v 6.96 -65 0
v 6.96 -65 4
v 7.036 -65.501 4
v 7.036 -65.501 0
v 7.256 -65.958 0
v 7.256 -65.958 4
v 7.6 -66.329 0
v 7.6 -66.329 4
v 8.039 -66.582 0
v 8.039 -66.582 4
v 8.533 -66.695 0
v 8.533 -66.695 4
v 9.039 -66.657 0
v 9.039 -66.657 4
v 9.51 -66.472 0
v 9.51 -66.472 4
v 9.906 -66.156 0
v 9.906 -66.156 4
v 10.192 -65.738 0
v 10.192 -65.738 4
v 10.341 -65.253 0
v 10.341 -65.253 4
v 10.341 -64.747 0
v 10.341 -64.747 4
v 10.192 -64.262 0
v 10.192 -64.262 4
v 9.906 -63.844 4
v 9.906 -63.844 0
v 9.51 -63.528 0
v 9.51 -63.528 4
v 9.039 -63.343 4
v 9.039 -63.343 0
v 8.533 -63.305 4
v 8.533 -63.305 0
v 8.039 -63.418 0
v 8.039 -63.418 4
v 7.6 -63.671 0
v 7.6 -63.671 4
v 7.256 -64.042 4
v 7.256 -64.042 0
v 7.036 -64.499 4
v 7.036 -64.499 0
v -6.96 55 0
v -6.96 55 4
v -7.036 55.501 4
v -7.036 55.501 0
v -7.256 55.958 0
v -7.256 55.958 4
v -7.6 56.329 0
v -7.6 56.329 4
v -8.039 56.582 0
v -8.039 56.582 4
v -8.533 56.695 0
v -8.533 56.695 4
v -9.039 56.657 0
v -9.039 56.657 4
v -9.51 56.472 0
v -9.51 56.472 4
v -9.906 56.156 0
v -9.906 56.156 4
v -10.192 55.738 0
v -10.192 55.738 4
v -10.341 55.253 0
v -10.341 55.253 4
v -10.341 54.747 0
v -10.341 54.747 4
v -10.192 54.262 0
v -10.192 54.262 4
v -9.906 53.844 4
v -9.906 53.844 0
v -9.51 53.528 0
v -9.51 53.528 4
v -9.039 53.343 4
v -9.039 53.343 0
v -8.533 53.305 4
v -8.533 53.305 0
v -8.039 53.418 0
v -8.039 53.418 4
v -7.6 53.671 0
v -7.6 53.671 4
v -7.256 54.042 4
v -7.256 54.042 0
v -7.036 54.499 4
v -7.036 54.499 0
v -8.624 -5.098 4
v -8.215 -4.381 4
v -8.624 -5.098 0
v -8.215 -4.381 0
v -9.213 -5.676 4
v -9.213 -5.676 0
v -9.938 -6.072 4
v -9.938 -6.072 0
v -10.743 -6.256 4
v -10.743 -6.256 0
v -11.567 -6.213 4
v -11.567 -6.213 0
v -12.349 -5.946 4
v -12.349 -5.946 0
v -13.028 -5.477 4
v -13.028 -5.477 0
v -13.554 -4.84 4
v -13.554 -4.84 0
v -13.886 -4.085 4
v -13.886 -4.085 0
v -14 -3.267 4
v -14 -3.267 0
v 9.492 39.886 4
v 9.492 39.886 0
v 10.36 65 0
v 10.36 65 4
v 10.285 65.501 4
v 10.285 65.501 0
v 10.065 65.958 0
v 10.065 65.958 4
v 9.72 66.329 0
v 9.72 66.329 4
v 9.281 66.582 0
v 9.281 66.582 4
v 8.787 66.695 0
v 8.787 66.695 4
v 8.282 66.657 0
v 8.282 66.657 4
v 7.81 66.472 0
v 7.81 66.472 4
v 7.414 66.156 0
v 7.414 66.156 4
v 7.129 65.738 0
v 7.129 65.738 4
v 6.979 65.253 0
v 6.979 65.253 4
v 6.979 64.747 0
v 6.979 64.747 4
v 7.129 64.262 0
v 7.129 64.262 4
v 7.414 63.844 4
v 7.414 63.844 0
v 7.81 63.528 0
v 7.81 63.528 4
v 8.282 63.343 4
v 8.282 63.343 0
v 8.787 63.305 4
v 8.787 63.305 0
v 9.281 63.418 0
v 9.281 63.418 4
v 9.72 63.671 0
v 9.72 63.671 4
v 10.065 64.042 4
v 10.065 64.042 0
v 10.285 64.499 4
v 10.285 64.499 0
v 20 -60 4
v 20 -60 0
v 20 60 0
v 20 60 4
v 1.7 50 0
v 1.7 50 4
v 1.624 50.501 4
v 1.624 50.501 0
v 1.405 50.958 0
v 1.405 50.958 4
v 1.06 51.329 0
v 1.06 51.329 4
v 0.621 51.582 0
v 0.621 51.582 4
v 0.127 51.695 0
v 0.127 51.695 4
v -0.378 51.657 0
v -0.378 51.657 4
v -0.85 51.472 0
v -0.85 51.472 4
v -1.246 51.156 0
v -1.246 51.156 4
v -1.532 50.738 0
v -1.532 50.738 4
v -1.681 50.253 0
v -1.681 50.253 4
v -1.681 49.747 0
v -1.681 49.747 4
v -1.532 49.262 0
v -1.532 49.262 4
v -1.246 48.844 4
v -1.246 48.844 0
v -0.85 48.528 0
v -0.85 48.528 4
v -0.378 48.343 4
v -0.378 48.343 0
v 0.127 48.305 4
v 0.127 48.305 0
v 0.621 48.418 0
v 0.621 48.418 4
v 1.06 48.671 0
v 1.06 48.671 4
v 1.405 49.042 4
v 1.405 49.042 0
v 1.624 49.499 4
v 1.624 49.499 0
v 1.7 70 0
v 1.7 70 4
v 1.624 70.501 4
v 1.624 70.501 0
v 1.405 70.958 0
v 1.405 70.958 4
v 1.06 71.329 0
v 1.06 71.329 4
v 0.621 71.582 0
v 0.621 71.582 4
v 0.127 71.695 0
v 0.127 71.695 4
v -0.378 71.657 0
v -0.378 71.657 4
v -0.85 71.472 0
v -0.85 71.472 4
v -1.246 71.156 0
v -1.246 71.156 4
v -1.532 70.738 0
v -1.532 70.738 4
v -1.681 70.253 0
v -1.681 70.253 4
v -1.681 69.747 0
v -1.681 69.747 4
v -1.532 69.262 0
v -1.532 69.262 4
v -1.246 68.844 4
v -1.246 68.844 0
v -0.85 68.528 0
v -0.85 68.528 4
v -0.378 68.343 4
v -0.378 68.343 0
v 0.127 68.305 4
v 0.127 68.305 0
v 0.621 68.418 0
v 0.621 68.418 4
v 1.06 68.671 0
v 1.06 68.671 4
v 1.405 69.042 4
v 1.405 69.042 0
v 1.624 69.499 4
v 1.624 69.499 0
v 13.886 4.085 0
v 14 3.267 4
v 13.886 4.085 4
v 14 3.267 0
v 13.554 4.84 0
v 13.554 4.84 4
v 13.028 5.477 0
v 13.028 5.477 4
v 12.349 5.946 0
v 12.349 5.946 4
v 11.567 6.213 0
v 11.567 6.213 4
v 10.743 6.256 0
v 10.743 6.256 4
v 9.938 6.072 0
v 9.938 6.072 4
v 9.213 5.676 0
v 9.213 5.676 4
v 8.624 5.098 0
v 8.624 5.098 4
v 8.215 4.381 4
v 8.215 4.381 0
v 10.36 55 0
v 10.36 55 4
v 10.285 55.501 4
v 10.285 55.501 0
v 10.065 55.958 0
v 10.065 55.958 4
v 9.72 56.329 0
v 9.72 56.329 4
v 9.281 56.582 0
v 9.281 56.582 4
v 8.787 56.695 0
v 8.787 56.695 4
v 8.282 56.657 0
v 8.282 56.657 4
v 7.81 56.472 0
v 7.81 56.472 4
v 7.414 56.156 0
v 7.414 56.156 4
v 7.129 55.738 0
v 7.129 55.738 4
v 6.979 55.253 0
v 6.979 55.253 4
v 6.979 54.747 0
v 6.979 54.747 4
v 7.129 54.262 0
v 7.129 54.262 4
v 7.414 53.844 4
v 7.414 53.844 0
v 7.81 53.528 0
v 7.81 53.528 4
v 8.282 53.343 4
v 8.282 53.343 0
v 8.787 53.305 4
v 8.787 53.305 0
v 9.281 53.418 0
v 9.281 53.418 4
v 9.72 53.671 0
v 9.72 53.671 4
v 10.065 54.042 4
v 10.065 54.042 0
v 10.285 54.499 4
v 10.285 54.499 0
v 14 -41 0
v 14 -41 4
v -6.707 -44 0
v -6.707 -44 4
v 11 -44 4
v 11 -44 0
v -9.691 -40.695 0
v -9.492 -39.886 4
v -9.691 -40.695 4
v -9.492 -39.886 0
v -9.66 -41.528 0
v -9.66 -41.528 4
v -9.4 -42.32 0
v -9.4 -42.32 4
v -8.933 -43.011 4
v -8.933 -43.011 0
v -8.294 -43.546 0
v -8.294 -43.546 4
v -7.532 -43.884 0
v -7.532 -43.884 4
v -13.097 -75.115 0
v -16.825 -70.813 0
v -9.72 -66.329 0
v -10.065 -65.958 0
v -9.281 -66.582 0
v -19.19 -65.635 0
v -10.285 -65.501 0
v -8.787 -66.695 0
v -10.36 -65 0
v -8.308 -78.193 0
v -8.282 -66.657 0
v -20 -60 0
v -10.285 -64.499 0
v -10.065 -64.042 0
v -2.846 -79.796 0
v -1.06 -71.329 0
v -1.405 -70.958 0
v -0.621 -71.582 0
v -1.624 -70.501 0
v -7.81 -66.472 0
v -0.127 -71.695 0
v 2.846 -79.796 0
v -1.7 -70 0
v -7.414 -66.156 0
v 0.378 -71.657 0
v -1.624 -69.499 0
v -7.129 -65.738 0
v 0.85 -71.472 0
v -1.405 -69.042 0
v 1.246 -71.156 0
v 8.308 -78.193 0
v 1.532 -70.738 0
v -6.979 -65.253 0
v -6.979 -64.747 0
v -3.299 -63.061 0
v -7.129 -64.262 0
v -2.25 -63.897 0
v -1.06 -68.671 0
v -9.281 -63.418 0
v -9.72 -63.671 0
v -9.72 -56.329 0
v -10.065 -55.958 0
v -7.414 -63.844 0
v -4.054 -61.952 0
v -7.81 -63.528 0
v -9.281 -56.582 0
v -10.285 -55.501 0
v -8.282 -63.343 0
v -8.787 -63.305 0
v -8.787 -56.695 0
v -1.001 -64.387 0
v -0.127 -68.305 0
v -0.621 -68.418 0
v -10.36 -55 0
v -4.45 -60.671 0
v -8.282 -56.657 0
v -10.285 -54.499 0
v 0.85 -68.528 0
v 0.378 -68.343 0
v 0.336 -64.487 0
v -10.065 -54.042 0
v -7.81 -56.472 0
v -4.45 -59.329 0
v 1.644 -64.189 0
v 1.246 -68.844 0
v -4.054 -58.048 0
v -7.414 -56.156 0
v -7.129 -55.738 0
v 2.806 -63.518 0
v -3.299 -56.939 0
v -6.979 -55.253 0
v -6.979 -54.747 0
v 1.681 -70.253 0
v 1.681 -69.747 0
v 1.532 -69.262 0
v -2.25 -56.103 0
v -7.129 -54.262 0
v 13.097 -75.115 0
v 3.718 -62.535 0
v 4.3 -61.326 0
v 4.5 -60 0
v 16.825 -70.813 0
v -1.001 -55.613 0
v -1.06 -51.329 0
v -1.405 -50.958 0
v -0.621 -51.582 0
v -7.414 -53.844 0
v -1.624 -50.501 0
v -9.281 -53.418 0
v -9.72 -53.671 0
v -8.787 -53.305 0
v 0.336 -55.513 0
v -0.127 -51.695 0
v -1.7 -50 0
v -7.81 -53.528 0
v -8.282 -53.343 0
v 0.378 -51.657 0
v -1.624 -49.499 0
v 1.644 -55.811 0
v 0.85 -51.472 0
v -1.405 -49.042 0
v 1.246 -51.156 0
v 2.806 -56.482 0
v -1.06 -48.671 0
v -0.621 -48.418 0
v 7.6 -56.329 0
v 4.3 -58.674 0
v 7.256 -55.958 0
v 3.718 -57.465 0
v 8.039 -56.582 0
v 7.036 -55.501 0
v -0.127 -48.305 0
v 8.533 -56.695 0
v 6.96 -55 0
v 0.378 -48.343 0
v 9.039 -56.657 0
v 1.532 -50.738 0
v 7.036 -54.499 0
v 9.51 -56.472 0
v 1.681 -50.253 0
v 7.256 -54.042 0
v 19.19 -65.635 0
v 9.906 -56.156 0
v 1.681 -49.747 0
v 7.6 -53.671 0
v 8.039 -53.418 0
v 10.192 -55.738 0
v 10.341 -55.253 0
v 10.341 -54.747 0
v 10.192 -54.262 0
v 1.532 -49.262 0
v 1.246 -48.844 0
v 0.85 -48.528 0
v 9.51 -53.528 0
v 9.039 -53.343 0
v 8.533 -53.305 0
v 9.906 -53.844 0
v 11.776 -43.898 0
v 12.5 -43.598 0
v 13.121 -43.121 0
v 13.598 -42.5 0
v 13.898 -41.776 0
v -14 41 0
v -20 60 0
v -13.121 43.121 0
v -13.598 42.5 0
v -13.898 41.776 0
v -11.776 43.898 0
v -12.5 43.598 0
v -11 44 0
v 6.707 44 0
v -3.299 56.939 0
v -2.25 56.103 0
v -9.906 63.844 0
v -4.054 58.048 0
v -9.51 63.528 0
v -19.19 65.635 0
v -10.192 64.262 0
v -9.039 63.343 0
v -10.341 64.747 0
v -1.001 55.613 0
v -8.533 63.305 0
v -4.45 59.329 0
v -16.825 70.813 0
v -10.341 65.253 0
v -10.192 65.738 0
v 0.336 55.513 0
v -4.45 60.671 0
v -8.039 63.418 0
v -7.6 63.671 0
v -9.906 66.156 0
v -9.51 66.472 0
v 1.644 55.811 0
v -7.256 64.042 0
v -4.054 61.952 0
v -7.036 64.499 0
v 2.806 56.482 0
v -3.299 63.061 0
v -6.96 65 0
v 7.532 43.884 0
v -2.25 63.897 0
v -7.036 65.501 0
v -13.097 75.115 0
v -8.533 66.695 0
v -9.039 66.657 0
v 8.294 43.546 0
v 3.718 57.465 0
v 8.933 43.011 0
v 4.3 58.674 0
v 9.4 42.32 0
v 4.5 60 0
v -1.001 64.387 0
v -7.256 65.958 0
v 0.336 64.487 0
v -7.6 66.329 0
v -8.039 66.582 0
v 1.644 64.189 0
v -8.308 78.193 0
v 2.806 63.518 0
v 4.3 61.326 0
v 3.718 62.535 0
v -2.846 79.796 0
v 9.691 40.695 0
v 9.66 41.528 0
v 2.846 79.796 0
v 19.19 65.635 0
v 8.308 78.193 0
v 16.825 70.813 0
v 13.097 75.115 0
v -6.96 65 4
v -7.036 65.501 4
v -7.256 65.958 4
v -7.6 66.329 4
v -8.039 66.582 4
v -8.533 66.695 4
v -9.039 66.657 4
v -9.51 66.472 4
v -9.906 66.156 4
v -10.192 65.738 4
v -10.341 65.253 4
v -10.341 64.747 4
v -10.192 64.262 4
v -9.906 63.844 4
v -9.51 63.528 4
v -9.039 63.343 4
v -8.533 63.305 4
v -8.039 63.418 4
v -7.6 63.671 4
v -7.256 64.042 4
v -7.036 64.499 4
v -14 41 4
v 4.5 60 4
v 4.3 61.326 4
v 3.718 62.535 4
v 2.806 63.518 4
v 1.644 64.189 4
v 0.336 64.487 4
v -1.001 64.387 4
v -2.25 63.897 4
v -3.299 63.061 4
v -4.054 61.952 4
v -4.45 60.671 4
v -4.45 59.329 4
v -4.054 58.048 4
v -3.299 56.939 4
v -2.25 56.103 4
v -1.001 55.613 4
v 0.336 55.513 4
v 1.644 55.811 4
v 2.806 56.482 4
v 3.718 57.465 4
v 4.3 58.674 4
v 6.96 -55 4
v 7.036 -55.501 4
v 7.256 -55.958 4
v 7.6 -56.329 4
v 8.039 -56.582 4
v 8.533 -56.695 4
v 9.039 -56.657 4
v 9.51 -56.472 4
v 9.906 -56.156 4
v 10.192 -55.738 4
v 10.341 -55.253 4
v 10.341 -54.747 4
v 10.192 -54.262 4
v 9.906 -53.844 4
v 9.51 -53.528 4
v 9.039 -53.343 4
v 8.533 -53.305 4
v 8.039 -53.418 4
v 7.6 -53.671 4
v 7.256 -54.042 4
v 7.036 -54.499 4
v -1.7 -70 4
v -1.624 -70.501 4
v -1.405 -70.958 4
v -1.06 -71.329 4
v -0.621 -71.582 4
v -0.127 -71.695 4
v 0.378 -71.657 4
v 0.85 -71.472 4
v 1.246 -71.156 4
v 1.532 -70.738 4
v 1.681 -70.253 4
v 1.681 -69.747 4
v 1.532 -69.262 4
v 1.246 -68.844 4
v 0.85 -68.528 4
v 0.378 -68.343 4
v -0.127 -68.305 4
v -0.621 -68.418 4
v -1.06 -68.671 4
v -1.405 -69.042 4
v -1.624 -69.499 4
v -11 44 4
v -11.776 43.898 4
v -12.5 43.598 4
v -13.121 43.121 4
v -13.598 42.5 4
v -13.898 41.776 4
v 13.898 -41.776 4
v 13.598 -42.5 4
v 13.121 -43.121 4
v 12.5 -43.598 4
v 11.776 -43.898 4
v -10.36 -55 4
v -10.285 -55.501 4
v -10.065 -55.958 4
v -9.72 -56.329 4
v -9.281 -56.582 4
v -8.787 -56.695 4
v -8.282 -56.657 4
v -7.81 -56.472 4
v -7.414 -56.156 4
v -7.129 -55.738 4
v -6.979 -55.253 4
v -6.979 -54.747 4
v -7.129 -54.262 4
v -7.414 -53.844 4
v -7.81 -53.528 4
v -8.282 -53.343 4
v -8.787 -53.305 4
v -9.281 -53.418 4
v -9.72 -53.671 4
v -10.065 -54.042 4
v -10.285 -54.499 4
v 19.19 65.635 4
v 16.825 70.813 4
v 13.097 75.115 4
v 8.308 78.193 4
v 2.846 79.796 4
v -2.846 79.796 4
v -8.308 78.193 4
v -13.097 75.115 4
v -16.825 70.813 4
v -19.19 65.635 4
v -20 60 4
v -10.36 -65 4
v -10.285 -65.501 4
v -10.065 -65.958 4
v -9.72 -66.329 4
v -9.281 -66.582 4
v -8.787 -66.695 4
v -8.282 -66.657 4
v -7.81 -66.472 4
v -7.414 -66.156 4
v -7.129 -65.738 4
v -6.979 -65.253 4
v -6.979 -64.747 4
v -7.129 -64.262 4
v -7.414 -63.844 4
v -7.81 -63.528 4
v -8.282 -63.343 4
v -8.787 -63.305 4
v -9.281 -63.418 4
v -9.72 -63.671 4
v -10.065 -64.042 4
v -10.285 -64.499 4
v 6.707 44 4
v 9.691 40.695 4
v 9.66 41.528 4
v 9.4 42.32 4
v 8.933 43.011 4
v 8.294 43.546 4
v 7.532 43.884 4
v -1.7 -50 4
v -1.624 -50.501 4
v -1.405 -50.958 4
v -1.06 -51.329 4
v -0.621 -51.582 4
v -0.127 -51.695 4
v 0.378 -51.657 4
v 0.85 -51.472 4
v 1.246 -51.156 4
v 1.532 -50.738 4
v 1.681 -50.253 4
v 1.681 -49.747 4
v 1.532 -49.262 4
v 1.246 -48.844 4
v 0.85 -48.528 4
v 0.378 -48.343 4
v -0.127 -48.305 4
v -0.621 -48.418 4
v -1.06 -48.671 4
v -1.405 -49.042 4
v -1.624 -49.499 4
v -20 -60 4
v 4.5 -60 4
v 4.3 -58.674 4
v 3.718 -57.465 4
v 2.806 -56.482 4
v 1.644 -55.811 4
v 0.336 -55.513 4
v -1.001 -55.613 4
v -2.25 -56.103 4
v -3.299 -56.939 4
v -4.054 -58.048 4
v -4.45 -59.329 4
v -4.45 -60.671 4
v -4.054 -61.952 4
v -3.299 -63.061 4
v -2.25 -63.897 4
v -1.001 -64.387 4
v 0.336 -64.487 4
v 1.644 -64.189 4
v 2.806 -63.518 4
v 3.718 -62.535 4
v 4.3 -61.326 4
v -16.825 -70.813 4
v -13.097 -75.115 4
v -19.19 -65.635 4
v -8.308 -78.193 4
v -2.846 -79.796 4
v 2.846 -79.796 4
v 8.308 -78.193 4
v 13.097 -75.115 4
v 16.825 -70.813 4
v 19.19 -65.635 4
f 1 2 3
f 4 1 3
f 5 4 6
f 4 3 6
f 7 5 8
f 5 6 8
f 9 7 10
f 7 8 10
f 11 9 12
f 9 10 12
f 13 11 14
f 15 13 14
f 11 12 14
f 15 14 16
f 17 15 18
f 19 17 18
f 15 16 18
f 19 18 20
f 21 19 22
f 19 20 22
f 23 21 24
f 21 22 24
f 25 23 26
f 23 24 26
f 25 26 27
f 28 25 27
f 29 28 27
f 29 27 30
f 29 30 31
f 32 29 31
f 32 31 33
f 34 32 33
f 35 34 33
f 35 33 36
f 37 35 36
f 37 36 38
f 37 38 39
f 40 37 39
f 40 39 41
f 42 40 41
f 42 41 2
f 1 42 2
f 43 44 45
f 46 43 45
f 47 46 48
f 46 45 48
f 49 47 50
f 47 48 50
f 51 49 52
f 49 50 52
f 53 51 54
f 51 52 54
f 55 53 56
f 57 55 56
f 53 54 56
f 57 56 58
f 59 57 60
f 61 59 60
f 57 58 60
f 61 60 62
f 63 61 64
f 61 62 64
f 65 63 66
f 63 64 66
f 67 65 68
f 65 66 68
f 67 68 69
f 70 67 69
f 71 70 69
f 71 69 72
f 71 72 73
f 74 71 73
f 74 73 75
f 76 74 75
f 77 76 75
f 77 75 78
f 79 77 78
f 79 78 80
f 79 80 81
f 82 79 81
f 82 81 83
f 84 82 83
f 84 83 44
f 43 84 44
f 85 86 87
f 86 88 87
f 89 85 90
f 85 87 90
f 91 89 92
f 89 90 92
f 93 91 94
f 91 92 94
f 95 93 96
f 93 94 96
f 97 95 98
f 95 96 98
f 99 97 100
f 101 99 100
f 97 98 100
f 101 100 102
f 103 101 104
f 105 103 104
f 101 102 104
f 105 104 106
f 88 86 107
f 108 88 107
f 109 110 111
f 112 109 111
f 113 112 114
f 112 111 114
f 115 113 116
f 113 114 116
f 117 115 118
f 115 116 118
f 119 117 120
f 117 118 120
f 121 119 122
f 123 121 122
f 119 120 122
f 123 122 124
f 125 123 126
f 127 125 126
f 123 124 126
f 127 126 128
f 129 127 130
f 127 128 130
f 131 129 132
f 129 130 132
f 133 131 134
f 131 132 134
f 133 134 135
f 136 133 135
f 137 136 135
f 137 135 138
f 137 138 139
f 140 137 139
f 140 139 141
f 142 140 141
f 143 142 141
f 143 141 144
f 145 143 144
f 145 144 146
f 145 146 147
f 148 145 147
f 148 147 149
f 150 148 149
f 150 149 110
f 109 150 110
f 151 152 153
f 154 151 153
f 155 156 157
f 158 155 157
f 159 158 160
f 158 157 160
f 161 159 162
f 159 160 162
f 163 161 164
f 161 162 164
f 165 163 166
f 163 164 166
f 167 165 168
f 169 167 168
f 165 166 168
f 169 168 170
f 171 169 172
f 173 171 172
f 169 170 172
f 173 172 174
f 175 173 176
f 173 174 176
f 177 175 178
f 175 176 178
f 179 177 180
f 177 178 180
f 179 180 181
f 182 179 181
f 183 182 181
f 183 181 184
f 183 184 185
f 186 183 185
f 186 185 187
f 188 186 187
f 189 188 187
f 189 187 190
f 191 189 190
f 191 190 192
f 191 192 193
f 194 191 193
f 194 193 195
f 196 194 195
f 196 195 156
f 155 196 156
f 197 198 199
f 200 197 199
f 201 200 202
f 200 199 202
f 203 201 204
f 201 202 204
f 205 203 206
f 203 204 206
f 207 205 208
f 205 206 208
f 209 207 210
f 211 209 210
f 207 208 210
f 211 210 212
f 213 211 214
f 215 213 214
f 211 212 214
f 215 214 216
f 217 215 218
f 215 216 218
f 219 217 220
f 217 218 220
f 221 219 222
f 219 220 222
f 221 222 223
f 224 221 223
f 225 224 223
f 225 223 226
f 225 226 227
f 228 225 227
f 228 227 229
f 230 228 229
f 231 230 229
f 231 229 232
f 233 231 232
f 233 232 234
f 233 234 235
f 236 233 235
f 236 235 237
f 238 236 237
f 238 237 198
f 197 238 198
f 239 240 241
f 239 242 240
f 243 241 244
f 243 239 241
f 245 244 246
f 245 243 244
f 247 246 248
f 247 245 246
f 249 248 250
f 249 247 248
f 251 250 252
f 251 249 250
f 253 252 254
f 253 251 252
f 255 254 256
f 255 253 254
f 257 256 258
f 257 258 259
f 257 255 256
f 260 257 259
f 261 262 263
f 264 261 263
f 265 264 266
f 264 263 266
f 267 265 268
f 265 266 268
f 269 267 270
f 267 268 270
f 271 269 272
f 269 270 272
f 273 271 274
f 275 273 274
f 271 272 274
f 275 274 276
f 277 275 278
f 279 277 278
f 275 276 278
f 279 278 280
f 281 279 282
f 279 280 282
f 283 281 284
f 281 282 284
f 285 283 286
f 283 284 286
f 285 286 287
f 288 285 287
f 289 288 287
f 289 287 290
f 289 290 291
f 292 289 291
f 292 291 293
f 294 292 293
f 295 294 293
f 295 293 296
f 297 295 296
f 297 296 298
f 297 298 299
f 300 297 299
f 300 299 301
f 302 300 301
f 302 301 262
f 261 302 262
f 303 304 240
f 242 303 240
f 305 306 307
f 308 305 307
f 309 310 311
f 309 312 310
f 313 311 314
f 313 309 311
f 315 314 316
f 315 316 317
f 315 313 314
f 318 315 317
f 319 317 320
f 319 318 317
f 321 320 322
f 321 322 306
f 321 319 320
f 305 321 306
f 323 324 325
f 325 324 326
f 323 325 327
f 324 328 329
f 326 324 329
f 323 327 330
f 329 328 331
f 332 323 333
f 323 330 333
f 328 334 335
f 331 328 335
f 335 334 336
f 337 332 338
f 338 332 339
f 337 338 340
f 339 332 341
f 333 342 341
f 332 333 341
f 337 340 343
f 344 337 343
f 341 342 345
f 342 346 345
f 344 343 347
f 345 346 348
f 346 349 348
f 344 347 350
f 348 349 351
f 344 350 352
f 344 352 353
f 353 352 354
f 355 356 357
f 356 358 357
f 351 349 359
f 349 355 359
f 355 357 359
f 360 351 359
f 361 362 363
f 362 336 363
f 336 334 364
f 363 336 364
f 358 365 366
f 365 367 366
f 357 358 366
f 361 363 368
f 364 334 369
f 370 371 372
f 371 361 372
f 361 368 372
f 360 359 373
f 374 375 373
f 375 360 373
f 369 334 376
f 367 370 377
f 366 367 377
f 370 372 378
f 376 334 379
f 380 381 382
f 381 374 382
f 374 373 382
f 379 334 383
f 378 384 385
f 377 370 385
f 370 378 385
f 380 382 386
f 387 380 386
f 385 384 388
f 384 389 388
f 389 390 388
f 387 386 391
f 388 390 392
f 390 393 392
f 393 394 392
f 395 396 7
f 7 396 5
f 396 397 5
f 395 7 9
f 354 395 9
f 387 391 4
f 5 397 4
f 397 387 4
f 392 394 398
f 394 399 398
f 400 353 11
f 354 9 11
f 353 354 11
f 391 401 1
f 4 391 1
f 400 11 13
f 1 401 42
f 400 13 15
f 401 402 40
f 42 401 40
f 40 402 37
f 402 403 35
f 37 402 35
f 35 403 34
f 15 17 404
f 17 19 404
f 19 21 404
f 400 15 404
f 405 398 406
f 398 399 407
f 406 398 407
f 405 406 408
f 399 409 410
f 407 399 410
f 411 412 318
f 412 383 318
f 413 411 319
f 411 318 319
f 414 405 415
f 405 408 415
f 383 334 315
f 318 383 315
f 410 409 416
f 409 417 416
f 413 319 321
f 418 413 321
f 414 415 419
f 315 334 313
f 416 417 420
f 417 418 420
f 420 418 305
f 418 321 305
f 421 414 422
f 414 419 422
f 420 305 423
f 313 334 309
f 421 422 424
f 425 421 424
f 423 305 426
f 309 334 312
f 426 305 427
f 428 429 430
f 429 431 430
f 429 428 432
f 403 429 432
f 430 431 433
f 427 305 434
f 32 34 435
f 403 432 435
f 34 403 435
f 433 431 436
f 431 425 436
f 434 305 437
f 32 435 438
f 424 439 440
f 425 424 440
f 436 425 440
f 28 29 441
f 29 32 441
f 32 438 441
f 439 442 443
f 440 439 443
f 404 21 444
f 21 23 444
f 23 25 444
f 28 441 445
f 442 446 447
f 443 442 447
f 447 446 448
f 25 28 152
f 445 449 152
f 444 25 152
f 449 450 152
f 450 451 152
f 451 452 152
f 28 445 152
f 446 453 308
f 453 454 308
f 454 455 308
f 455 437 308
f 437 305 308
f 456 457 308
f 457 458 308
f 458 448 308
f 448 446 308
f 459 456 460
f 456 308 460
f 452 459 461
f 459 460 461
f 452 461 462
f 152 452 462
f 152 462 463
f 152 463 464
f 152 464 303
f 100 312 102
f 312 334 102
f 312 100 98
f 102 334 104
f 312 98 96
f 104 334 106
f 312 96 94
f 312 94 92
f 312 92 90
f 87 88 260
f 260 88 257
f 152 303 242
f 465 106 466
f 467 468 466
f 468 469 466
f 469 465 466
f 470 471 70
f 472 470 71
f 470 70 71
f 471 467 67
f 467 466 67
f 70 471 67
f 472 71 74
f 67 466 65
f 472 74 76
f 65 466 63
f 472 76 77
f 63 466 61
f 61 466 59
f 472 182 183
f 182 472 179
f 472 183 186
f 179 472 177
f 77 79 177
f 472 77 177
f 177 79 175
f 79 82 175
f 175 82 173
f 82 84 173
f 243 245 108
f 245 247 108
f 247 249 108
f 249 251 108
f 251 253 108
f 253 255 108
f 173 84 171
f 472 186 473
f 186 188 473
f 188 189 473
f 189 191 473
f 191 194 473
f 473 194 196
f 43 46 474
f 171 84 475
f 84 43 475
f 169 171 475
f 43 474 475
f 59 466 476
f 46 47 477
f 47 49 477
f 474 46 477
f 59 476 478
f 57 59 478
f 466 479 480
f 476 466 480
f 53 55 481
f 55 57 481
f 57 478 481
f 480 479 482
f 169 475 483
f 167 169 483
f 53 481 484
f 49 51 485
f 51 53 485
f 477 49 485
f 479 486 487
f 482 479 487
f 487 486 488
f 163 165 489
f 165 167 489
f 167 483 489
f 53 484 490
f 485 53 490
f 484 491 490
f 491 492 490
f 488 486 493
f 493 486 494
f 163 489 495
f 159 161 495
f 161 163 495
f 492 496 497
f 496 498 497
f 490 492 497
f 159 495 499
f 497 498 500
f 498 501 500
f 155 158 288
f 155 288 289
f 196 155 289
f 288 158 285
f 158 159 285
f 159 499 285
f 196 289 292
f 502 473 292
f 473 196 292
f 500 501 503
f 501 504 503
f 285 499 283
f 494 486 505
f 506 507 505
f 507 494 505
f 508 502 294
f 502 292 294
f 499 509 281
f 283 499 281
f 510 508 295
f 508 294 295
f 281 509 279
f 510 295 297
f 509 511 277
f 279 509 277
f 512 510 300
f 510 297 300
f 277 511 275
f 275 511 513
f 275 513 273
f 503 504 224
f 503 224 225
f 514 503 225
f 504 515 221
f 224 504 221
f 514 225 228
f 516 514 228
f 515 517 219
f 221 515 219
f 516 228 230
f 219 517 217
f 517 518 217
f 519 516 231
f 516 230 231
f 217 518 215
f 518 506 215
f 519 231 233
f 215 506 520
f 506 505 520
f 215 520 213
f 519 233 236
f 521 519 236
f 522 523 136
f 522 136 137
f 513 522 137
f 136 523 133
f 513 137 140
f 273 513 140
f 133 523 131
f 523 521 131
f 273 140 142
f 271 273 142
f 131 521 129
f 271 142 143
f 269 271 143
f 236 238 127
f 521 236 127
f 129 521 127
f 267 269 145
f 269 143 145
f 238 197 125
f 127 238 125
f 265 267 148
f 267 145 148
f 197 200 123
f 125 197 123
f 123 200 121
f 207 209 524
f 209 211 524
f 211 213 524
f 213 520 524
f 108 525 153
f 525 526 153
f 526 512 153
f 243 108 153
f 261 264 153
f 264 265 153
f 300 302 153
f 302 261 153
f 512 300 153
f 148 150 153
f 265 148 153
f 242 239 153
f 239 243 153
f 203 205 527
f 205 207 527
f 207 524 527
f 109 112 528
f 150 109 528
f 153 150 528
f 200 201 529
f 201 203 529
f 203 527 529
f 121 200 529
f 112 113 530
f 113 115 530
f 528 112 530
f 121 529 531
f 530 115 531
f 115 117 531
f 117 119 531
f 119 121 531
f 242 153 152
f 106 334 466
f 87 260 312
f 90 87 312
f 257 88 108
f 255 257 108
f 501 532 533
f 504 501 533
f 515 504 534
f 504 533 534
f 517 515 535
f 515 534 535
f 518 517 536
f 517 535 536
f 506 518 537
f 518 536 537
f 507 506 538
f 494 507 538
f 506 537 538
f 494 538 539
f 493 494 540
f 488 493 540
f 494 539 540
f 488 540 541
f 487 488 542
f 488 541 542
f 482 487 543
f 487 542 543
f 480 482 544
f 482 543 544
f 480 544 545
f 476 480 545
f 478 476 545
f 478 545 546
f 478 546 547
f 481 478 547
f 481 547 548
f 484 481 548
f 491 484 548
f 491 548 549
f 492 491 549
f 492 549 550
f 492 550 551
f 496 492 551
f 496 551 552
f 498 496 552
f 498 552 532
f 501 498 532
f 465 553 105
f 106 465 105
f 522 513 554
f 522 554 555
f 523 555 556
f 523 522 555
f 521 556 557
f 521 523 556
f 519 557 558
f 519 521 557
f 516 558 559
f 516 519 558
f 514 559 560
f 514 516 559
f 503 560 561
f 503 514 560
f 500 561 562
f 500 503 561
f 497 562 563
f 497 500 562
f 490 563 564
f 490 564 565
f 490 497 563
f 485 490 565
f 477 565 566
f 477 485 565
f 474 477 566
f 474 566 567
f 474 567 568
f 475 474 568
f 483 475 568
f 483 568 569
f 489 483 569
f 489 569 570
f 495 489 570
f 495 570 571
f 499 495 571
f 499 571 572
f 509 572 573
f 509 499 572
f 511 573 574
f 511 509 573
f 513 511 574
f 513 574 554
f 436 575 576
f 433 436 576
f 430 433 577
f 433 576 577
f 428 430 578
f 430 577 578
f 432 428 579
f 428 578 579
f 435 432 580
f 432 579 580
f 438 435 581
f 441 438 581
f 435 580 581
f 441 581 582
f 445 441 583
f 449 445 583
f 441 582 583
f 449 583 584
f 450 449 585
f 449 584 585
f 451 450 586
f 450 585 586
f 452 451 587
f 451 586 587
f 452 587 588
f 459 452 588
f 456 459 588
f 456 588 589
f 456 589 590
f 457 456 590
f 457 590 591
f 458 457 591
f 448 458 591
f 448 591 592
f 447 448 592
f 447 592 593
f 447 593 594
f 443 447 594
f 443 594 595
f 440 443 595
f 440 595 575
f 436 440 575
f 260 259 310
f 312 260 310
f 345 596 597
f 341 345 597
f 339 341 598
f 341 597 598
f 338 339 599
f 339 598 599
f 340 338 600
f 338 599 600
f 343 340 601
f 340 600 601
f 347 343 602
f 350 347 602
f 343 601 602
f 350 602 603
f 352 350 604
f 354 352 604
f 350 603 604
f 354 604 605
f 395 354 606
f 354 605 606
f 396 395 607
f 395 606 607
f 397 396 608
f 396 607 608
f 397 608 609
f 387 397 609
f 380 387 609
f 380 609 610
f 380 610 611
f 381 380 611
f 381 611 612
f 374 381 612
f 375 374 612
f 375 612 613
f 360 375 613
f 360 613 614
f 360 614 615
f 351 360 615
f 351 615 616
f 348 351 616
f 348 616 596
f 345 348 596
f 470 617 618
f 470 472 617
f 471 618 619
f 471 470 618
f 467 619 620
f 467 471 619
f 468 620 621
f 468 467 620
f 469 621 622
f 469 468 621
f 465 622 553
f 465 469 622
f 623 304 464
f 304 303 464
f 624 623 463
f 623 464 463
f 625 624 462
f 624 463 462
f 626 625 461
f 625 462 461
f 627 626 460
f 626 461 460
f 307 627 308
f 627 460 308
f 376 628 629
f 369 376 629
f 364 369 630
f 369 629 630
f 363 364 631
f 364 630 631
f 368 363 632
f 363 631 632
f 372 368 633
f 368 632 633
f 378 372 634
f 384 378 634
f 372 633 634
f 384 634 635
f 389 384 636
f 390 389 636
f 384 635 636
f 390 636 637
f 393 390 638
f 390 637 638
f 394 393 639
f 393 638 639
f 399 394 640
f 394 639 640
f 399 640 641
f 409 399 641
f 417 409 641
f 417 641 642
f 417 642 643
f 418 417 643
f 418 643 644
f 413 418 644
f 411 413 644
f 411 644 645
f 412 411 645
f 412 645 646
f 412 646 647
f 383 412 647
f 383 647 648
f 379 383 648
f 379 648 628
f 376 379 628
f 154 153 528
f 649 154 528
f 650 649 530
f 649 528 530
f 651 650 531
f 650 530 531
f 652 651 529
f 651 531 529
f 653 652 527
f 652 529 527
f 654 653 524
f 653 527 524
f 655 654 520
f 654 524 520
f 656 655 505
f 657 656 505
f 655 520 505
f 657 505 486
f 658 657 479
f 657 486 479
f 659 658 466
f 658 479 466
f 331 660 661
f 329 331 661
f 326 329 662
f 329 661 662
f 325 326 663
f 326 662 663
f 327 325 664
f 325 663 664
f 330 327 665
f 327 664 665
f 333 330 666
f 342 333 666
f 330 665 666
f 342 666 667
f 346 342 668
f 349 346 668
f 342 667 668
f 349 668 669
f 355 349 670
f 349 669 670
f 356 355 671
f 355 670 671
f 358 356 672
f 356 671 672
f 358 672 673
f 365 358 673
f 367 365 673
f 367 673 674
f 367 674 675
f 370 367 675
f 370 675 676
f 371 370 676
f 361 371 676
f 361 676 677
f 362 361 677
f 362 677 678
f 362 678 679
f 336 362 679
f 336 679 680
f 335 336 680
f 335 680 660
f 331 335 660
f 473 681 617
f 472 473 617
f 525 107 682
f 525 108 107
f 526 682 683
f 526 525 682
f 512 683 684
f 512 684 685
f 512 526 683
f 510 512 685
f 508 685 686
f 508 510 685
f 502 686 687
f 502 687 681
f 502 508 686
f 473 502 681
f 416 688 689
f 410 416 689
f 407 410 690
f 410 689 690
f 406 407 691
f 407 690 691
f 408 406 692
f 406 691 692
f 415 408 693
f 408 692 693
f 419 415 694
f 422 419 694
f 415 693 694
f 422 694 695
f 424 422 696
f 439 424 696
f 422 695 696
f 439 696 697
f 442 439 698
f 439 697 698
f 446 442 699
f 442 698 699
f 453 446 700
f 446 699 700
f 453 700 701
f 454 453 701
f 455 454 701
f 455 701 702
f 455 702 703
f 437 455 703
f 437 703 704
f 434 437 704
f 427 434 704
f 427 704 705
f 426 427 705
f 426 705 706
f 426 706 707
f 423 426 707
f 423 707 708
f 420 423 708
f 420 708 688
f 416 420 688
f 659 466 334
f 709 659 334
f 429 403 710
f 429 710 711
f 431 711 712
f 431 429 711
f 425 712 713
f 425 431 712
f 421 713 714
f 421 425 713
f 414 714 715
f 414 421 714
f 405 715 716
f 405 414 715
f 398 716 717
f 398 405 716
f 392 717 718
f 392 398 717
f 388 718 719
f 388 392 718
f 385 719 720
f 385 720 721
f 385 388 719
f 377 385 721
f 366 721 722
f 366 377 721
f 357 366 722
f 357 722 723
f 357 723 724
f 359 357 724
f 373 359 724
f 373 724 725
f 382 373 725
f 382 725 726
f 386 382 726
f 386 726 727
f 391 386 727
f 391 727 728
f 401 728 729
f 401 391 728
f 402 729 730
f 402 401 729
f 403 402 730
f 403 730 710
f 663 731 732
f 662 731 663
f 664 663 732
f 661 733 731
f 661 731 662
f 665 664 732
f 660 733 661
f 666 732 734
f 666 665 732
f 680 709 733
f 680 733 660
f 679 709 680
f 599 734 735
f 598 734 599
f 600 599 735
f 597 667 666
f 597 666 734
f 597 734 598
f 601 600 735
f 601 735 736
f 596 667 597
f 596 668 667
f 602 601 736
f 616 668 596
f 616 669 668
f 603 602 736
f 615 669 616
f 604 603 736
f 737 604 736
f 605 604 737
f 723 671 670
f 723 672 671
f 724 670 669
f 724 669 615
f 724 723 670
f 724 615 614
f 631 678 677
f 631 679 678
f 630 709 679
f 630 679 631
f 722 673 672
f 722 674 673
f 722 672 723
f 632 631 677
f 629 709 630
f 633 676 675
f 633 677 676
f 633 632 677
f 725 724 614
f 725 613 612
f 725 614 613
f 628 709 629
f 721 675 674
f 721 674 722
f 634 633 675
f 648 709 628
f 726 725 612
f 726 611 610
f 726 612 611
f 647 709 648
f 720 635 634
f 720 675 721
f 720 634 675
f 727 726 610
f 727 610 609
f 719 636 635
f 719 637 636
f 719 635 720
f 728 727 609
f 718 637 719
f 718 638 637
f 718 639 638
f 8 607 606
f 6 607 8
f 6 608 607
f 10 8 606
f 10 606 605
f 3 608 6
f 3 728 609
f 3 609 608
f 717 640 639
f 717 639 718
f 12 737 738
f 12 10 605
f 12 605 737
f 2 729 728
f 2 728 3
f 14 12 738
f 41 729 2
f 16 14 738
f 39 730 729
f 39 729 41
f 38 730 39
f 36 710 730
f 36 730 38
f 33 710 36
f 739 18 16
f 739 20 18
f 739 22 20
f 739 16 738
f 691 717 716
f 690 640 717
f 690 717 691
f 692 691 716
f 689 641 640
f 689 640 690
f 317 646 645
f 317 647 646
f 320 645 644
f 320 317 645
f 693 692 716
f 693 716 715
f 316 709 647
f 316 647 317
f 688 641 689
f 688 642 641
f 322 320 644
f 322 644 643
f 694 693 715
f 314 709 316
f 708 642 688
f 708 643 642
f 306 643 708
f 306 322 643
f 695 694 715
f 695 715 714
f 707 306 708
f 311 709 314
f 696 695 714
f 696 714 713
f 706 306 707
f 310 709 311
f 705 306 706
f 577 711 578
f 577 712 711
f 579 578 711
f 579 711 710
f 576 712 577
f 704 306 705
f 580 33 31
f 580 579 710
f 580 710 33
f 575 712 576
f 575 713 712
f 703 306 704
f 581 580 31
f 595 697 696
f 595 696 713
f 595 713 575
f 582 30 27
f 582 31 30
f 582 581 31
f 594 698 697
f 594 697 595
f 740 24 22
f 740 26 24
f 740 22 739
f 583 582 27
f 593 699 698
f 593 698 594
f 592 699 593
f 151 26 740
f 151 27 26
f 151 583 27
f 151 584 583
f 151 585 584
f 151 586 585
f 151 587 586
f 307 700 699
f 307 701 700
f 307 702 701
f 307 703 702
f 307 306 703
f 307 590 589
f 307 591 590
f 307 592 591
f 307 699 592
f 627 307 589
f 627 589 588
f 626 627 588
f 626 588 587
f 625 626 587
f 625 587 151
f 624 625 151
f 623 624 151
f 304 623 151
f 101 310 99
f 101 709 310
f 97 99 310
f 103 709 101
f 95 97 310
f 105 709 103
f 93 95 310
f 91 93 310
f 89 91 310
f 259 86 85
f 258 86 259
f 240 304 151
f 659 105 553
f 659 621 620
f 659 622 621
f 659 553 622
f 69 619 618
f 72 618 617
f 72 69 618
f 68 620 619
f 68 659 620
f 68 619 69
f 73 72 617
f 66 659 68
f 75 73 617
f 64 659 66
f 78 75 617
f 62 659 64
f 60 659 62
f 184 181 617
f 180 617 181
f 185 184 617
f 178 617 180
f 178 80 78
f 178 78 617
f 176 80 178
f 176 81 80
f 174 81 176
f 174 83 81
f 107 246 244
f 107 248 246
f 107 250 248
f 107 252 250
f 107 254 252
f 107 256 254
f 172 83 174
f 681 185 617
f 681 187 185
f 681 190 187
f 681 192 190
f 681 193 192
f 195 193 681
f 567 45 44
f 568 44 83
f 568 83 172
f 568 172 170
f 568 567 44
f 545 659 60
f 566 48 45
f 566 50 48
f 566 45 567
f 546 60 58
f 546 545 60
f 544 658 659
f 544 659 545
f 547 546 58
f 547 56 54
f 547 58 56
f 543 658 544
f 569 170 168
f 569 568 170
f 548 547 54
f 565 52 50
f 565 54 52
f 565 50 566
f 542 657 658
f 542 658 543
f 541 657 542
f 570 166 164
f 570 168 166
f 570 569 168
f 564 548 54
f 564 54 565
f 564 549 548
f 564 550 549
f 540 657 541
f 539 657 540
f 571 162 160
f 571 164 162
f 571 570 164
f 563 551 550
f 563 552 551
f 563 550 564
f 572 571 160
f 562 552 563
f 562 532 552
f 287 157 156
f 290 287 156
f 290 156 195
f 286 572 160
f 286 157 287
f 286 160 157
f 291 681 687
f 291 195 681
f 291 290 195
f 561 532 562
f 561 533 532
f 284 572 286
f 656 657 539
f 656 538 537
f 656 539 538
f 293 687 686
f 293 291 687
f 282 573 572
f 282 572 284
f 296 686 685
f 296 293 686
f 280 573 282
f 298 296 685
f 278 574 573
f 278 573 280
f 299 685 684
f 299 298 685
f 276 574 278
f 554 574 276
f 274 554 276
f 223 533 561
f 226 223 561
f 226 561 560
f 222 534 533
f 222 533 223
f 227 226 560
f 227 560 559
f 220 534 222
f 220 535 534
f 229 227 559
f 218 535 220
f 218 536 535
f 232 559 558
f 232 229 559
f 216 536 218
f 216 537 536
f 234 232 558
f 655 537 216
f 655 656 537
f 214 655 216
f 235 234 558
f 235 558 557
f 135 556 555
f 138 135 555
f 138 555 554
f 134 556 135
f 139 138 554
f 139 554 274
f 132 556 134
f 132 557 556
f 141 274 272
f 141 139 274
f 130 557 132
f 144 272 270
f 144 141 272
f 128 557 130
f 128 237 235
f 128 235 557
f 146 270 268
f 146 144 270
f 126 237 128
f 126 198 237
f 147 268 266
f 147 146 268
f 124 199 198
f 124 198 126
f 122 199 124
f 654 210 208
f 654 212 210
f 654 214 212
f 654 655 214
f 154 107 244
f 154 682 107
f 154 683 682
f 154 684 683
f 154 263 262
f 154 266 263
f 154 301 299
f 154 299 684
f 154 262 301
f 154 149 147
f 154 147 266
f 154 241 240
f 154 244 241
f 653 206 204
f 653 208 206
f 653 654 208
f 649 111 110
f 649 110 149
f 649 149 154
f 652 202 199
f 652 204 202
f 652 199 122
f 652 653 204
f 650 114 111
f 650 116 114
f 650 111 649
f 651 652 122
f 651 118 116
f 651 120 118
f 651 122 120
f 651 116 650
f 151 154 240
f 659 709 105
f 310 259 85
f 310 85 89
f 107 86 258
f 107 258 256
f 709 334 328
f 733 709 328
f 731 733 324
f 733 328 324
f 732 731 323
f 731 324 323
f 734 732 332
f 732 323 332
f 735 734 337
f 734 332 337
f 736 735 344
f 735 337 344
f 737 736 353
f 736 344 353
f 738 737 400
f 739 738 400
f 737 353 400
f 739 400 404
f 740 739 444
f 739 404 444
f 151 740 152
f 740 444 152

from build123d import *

# Parameters (mm, degrees)
SKETCH_1_R          = 4.5
EXTRUDE_2_DEPTH     = 4
CUT_EXTRUDE_1_DEPTH = 83.559069762
FILLET_1_R          = 3
SKETCH_6_R          = 1.7
CUT_EXTRUDE_2_DEPTH = 83.559069762


with BuildPart() as part:
    # 草图1 → 凸台-拉伸2 (new body)
    with BuildSketch(Plane.XY):
        with BuildLine():
            Line((20, -60), (20, 60))
            ThreePointArc((20, 60), (0, 80), (-20, 60))
            Line((-20, 60), (-20, -60))
            ThreePointArc((-20, -60), (0, -80), (20, -60))
        make_face()
        with Locations((0, 60)):
            Circle(SKETCH_1_R, mode=Mode.SUBTRACT)
        with Locations((0, -60)):
            Circle(SKETCH_1_R, mode=Mode.SUBTRACT)
    extrude(amount=EXTRUDE_2_DEPTH)

    # 草图4 → 切除-拉伸1 (cut, through all)
    with BuildSketch(Plane.XY.offset(4)):
        Polygon((-14, -18.844505579), (11.137802231, 44), (-14, 44), align=None)
        Polygon((14, -44), (14, 18.844505579), (-11.137802231, -44), align=None)
    extrude(amount=-CUT_EXTRUDE_1_DEPTH, mode=Mode.SUBTRACT)

    # 圆角1
    fillet_1_edges = [part.edges().sort_by_distance(p)[0] for p in [
        (14, -44, 2),
        (-11.137802231, -44, 2),
        (14, 18.844505579, 2),
        (-14, -18.844505579, 2),
        (-14, 44, 2),
        (11.137802231, 44, 2),
    ]]
    fillet(fillet_1_edges, radius=FILLET_1_R)

    # 草图6 → 切除-拉伸2 (cut, through all)
    with BuildSketch(Plane.XY.offset(4)):
        with Locations((0, 50)):
            Circle(SKETCH_6_R)
        with Locations((-8.660254038, 55)):
            Circle(SKETCH_6_R)
        with Locations((-8.660254038, 65)):
            Circle(SKETCH_6_R)
        with Locations((0, 70)):
            Circle(SKETCH_6_R)
        with Locations((8.660254038, 65)):
            Circle(SKETCH_6_R)
        with Locations((8.660254038, 55)):
            Circle(SKETCH_6_R)
        with Locations(Location((0, -70, 0), (0, 0, 180))):
            Circle(SKETCH_6_R)
        with Locations(Location((-8.660254038, -65, 0), (0, 0, 180))):
            Circle(SKETCH_6_R)
        with Locations(Location((-8.660254038, -55, 0), (0, 0, 180))):
            Circle(SKETCH_6_R)
        with Locations(Location((0, -50, 0), (0, 0, 180))):
            Circle(SKETCH_6_R)
        with Locations(Location((8.660254038, -55, 0), (0, 0, 180))):
            Circle(SKETCH_6_R)
        with Locations(Location((8.660254038, -65, 0), (0, 0, 180))):
            Circle(SKETCH_6_R)
    extrude(amount=-CUT_EXTRUDE_2_DEPTH, mode=Mode.SUBTRACT)


solid = part.part
